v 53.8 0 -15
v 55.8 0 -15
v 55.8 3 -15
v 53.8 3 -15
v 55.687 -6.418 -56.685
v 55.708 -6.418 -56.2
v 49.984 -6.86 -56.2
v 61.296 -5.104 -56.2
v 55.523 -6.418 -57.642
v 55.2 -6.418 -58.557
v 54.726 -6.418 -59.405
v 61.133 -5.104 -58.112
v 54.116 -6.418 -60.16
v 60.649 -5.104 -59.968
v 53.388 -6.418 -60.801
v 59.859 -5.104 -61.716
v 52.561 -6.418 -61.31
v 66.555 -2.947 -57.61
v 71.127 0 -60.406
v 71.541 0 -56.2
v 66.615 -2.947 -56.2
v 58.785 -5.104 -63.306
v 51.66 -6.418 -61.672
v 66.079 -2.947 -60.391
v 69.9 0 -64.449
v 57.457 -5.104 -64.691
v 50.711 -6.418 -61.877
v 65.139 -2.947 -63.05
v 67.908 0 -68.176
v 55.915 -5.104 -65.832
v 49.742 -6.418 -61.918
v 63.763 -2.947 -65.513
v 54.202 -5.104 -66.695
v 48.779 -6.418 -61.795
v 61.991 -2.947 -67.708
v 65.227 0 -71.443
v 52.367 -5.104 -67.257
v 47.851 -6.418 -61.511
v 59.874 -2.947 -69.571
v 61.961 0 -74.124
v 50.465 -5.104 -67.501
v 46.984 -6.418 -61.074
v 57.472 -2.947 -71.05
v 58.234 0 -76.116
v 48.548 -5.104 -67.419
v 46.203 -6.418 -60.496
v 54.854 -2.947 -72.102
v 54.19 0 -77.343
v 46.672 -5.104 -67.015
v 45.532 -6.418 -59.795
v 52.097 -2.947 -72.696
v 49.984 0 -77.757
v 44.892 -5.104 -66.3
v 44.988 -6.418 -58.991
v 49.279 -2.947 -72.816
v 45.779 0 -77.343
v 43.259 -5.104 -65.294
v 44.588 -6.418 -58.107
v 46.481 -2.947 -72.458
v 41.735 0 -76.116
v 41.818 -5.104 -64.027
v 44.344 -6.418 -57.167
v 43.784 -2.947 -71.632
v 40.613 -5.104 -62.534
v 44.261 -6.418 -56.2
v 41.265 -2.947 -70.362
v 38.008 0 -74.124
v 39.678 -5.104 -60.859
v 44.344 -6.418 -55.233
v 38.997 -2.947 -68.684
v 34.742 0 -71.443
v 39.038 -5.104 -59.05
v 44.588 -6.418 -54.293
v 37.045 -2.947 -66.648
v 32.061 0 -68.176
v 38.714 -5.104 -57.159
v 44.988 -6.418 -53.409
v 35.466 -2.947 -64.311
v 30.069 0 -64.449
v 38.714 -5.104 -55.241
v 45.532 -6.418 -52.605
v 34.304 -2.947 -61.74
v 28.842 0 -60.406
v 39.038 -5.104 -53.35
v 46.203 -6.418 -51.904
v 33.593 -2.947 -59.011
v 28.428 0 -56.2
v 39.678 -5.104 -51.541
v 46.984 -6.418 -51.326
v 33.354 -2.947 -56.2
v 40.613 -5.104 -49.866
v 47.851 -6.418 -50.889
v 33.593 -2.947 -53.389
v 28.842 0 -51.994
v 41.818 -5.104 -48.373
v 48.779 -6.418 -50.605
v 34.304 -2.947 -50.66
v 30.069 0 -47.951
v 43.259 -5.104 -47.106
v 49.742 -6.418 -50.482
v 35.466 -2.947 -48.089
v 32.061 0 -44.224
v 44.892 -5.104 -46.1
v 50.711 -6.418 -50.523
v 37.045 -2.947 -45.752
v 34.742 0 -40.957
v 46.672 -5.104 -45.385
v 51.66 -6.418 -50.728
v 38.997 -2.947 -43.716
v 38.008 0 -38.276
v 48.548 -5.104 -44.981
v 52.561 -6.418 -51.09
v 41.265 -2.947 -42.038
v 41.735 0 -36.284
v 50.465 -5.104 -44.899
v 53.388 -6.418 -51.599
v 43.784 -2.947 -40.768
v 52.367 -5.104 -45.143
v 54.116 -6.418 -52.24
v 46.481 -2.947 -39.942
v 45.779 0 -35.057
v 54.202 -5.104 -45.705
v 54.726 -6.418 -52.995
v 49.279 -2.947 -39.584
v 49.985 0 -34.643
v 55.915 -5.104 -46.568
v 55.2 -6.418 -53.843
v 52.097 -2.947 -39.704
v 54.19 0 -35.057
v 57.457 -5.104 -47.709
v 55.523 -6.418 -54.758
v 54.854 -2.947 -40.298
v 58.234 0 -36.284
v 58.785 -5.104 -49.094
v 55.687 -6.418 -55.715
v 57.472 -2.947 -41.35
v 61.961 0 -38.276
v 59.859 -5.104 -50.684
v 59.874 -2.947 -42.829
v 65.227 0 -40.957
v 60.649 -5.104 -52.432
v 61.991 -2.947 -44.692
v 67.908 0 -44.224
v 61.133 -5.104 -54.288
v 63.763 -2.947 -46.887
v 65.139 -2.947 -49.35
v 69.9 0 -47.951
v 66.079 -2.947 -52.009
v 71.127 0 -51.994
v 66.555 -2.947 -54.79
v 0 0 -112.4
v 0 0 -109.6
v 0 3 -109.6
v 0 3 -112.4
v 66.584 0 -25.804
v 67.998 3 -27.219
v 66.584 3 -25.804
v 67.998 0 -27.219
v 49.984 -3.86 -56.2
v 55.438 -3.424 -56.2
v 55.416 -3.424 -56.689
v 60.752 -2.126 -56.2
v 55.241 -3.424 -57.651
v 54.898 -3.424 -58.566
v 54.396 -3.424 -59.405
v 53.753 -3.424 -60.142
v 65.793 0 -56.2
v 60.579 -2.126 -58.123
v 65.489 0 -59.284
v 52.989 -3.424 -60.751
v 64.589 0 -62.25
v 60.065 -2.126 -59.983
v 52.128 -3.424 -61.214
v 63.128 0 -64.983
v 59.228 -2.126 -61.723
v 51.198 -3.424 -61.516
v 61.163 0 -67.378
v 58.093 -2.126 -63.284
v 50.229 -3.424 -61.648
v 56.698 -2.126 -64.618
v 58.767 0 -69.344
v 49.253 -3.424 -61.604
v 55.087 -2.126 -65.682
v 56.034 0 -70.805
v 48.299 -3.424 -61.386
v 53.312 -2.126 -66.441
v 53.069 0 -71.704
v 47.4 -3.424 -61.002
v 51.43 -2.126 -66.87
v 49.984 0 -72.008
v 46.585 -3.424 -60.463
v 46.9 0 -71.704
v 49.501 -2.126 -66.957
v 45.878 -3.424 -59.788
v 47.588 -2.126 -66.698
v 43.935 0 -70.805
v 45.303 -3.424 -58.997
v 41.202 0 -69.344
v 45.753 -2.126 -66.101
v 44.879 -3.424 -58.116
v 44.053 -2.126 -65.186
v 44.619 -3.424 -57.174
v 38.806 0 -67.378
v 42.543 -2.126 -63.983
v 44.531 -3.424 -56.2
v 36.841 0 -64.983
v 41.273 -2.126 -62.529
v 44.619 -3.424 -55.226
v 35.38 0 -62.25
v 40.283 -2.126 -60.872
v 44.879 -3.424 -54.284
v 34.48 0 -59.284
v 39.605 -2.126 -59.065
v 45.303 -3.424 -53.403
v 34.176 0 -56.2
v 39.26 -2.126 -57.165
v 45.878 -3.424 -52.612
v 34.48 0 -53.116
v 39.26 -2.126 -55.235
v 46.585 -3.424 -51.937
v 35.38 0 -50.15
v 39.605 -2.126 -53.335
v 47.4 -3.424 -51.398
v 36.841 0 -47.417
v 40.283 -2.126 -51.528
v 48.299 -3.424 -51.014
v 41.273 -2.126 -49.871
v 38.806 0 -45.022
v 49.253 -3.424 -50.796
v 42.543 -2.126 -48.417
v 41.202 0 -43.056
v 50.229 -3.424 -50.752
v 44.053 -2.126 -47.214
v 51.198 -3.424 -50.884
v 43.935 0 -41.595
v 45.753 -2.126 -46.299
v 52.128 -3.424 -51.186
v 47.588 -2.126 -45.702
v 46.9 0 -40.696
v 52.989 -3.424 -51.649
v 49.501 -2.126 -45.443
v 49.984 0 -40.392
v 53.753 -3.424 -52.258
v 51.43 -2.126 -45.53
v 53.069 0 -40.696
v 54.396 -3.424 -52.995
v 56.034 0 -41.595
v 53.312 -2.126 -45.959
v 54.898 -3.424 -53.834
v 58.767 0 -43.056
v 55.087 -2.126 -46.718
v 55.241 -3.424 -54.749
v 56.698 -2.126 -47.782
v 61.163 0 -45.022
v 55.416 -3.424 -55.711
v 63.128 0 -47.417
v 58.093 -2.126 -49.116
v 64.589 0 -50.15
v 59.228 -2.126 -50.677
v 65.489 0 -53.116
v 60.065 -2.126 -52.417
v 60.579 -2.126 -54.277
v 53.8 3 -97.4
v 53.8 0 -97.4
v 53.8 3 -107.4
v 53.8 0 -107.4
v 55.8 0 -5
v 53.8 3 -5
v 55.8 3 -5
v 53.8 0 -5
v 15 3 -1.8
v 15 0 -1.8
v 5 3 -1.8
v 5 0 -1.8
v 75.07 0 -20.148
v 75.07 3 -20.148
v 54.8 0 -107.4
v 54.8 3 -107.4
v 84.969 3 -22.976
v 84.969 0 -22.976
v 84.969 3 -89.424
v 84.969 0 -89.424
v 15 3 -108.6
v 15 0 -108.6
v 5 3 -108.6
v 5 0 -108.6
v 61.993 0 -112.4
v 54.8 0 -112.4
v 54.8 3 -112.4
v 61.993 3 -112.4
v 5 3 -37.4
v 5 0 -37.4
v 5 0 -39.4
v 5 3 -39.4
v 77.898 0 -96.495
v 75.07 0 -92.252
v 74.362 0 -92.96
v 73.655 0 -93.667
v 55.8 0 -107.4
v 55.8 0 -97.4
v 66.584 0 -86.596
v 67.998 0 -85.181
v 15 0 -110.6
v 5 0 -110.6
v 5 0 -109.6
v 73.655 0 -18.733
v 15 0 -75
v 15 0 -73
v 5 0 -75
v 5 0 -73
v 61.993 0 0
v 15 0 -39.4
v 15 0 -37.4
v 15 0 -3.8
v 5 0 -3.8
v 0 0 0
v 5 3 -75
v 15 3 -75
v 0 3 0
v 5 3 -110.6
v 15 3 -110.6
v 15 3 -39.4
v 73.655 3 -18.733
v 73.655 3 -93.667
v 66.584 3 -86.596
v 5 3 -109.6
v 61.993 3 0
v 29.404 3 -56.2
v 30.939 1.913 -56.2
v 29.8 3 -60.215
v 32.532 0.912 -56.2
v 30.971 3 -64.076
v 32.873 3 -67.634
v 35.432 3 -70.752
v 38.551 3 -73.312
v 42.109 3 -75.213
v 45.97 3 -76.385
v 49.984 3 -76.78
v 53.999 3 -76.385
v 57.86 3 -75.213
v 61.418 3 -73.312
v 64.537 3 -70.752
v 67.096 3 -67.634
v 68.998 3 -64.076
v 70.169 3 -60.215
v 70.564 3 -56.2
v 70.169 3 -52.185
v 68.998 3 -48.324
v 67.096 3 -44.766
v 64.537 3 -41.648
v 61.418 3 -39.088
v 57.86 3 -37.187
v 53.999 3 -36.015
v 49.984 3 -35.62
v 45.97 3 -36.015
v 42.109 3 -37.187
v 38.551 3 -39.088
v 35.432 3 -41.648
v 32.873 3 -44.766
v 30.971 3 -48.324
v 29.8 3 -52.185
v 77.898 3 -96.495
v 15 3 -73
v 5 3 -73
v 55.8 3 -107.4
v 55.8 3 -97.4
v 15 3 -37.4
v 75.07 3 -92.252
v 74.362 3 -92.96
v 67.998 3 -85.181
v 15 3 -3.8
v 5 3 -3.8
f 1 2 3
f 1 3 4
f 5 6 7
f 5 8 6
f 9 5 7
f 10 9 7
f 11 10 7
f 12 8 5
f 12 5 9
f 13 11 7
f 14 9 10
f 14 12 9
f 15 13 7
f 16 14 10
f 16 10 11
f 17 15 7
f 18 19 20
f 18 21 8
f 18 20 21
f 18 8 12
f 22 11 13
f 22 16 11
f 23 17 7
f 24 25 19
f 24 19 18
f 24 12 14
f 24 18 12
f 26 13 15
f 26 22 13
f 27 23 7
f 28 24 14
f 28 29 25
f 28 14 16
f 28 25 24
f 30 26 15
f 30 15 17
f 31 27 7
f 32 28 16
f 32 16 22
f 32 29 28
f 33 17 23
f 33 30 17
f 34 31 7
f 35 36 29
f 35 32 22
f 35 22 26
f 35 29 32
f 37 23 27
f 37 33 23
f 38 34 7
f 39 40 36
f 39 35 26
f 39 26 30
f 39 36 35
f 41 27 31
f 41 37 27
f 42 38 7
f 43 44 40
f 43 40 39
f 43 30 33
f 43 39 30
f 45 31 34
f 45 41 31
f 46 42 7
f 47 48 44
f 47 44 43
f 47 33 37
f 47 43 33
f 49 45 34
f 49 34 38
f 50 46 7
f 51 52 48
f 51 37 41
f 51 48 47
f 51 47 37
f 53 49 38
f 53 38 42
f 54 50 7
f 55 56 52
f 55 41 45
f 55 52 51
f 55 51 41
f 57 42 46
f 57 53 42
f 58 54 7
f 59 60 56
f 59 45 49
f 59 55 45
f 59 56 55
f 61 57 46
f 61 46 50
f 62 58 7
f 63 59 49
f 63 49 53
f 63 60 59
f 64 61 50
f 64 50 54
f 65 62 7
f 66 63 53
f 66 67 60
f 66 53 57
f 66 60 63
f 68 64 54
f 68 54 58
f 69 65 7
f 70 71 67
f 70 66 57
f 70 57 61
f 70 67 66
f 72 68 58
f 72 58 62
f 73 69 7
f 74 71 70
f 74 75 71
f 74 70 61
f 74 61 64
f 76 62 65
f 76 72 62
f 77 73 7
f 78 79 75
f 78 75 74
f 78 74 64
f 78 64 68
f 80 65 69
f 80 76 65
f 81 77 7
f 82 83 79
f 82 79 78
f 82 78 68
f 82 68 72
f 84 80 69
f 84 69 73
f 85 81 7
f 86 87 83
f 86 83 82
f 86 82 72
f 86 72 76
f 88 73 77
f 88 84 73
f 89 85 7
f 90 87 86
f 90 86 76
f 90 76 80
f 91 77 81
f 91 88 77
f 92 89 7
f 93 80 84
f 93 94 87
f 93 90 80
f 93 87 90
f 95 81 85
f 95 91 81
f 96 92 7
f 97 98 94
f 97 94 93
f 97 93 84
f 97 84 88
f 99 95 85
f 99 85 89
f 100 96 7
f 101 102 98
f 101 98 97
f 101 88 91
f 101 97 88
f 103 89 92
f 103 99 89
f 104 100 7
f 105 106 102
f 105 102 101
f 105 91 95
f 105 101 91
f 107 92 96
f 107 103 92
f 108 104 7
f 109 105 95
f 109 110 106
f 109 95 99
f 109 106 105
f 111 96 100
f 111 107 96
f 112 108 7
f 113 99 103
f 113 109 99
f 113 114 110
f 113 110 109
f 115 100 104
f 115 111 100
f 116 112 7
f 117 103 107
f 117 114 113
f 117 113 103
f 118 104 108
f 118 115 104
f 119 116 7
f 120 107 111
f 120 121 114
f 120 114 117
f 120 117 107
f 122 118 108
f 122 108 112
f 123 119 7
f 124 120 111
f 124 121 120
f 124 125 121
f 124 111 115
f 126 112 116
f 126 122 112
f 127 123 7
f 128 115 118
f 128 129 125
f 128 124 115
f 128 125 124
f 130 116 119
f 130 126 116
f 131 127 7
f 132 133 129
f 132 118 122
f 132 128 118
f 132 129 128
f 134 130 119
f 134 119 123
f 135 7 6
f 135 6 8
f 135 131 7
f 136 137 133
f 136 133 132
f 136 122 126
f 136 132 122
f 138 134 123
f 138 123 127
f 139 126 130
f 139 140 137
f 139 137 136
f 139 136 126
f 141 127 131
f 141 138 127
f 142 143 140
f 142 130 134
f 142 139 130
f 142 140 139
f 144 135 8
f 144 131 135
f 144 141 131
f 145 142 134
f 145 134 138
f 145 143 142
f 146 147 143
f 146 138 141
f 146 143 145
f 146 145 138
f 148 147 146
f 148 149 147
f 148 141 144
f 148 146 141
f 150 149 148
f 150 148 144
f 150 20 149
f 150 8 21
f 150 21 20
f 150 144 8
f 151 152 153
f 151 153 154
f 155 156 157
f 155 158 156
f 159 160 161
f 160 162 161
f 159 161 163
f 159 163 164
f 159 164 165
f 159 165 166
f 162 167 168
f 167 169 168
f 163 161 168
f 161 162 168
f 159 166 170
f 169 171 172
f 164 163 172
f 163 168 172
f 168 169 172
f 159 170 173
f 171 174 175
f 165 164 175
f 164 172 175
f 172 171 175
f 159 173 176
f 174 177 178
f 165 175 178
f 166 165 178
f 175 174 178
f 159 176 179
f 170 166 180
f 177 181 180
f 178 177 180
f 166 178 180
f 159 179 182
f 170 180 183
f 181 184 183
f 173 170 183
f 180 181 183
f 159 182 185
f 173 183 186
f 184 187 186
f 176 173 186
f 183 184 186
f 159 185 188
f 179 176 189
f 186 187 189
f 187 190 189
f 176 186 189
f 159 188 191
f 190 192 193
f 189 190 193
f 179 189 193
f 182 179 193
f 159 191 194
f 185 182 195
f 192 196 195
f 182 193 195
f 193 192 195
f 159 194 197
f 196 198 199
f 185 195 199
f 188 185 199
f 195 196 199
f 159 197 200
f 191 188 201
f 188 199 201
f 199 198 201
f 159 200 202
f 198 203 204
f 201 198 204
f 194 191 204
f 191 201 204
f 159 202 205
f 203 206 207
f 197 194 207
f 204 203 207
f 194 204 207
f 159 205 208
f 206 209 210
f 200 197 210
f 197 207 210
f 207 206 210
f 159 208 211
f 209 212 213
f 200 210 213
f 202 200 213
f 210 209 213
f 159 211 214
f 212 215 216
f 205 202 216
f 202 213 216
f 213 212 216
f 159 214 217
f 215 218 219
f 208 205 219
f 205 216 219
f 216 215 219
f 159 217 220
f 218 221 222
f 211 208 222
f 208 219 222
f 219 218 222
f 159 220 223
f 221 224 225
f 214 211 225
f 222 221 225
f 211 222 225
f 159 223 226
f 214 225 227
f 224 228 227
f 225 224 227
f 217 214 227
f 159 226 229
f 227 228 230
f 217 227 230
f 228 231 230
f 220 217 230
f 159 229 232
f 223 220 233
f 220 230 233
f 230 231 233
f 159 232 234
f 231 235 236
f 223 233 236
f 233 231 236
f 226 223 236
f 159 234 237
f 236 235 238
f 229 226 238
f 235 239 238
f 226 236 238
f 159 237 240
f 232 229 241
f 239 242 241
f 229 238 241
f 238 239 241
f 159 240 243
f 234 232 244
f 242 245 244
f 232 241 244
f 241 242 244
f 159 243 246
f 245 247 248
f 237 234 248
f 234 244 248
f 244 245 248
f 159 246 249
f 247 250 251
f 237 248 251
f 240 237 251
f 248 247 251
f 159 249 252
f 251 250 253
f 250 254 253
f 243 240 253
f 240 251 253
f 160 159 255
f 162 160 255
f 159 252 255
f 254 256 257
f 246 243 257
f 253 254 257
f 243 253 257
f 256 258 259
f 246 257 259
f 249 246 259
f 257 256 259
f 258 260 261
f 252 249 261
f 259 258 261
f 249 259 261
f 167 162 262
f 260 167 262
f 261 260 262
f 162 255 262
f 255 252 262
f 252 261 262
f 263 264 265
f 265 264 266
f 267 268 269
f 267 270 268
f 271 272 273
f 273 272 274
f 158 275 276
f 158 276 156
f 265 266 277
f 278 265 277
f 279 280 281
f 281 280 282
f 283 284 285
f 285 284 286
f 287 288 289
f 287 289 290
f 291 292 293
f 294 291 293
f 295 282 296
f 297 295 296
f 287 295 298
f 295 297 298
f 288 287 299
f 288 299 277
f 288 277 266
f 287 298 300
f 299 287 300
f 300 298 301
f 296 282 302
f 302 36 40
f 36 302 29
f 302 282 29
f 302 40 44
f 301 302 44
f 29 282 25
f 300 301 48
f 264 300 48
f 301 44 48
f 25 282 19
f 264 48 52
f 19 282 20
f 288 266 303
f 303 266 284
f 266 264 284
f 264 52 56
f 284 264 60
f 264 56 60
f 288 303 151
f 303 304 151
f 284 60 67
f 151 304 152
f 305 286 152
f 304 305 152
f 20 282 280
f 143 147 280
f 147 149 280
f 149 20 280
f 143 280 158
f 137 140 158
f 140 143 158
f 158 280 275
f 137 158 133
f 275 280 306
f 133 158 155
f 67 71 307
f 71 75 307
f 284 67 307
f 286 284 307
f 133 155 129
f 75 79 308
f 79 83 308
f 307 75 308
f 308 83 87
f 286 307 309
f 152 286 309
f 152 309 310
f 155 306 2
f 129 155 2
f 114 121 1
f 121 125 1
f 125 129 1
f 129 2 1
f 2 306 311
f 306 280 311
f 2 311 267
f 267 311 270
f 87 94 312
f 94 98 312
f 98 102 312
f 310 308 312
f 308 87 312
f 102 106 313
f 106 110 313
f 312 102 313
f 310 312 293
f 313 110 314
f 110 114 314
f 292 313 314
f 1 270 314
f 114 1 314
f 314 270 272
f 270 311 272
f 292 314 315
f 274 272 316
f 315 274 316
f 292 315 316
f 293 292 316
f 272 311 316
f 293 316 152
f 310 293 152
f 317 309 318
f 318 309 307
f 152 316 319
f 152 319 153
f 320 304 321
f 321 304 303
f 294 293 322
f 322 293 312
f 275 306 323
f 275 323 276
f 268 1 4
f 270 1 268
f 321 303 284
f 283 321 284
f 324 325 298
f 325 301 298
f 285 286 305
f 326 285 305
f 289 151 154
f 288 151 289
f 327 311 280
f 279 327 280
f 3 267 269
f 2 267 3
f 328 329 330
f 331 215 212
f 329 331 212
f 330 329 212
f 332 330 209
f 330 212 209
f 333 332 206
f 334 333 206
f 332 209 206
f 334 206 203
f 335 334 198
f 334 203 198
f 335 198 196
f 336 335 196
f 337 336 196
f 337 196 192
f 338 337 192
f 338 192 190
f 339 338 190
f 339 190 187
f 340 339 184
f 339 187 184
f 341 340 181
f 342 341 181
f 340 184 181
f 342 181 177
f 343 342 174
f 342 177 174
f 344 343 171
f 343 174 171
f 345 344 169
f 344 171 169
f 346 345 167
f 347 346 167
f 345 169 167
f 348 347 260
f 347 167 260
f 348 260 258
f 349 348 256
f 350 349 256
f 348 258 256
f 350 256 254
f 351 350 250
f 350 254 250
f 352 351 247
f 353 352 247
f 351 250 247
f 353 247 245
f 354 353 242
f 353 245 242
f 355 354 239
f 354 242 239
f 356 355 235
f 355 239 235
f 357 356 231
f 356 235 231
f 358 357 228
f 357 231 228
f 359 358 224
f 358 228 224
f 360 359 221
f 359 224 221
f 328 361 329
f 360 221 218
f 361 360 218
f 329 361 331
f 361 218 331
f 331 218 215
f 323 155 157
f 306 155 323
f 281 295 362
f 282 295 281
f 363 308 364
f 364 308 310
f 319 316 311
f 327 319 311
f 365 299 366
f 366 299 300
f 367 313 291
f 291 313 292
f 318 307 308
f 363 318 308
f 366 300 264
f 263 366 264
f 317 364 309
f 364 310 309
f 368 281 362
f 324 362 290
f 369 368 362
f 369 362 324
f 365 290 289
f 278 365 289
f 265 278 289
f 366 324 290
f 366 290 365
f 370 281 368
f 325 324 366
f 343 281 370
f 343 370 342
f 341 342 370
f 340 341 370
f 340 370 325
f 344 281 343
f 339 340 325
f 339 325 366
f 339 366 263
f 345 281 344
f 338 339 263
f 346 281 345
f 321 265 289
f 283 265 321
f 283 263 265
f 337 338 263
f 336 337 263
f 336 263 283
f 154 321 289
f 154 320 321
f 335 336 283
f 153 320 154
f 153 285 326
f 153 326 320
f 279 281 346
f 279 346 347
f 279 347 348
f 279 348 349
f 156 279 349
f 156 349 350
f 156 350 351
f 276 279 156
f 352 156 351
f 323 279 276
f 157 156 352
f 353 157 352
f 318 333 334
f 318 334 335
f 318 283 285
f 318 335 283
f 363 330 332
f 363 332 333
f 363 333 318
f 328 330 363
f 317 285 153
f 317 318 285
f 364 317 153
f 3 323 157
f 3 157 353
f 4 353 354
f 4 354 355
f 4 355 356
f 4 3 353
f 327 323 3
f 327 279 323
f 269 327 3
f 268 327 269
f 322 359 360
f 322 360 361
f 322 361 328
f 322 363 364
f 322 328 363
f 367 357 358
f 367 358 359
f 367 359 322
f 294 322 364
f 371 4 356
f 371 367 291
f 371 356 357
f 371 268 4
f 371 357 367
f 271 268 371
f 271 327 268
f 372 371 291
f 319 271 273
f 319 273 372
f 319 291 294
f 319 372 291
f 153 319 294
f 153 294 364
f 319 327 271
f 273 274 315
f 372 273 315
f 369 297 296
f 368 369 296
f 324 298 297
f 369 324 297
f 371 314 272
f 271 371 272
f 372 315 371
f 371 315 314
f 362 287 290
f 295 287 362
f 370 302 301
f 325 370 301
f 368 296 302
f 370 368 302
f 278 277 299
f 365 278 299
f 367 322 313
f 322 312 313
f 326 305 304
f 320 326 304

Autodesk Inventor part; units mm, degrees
ref_plane "YZ Plane" through (0, 0, 0) normal (1, 0, 0) x (0, 1, 0)
ref_plane "XZ Plane" through (0, 0, 0) normal (0, 1, 0) x (-1, 0, 0)
sketch "Sketch1" plane through (0, 0, 0) normal (0, 1, 0) x (-1, 0, 0)
  line L0 (0, 0) -> (0, -112.4)
  line L1 (0, 0) -> (112.4, 0) construction
  line L2 (0, -112.4) -> (-61.993, -112.4)
  line L3 (0, -112.4) -> (61.993, -112.4) construction
  line L4 (0, 0) -> (-61.993, 0)
  line L5 (0, 0) -> (61.993, 0) construction
  line L6 (-61.993, -112.4) -> (-84.969, -89.424)
  line L7 (-61.993, -112.4) -> (-29.5, -112.4) construction
  line L8 (-61.993, 0) -> (-84.969, -22.976)
  line L9 (-61.993, 0) -> (-29.5, 0) construction
  line L10 (-84.969, -22.976) -> (-84.969, -89.424)
  line L11 (-84.969, -56.2) -> (-89.969, -56.2)
  line L12 (-84.969, -89.424) -> (-89.969, -56.2)
  line L13 (-84.969, -22.976) -> (-89.969, -56.2)
  line L14 (0, -112.4) -> (0, -109.6)
  line L15 (0, -109.6) -> (-5, -109.6)
  line L16 (-5, -109.6) -> (-5, -110.6)
  line L17 (-5, -110.6) -> (-15, -110.6)
  line L18 (-15, -110.6) -> (-15, -108.6)
  line L19 (-15, -108.6) -> (-5, -108.6)
  line L20 (-5, -108.6) -> (-5, -109.6)
  line L21 (-15, -75) -> (-15, -73)
  line L22 (-15, -73) -> (-5, -73)
  line L23 (-5, -75) -> (-15, -75)
  line L24 (-5, -74) -> (-5, -75)
  line L25 (-5, -73) -> (-5, -74)
  line L26 (-15, -39.4) -> (-15, -37.4)
  line L27 (-15, -37.4) -> (-5, -37.4)
  line L28 (-5, -39.4) -> (-15, -39.4)
  line L29 (-5, -38.4) -> (-5, -39.4)
  line L30 (-5, -37.4) -> (-5, -38.4)
  line L31 (-15, -3.8) -> (-15, -1.8)
  line L32 (-15, -1.8) -> (-5, -1.8)
  line L33 (-5, -3.8) -> (-15, -3.8)
  line L34 (-5, -2.8) -> (-5, -3.8)
  line L35 (-5, -1.8) -> (-5, -2.8)
  line L36 (-84.969, -89.424) -> (-77.898, -96.495)
  line L37 (-77.898, -96.495) -> (-74.3624, -92.9595)
  line L38 (-74.3624, -92.9595) -> (-75.0695, -92.2524)
  line L39 (-75.0695, -92.2524) -> (-67.9985, -85.1813)
  line L40 (-67.9985, -85.1813) -> (-66.5842, -86.5956)
  line L41 (-66.5842, -86.5956) -> (-73.6553, -93.6666)
  line L42 (-73.6553, -93.6666) -> (-74.3624, -92.9595)
  line L43 (-74.3624, -19.4405) -> (-75.0695, -20.1476)
  line L44 (-75.0695, -20.1476) -> (-67.9985, -27.2187)
  line L45 (-67.9985, -27.2187) -> (-66.5842, -25.8044)
  line L46 (-66.5842, -25.8044) -> (-73.6553, -18.7334)
  line L47 (-73.6553, -18.7334) -> (-74.3624, -19.4405)
  line L48 (-61.993, -112.4) -> (-54.8, -112.4)
  line L49 (-54.8, -112.4) -> (-54.8, -107.4)
  line L50 (-54.8, -107.4) -> (-55.8, -107.4)
  line L51 (-55.8, -107.4) -> (-55.8, -97.4)
  line L52 (-55.8, -97.4) -> (-53.8, -97.4)
  line L53 (-53.8, -97.4) -> (-53.8, -107.4)
  line L54 (-53.8, -107.4) -> (-54.8, -107.4)
  line L55 (-54.8, -5) -> (-55.8, -5)
  line L56 (-55.8, -5) -> (-55.8, -15)
  line L57 (-55.8, -15) -> (-53.8, -15)
  line L58 (-53.8, -15) -> (-53.8, -5)
  line L59 (-53.8, -5) -> (-54.8, -5)
  dimension "d0" = 112.4
  dimension "d1" = 90
  dimension "d2" = 61.993
  dimension "d3" = 180
  dimension "d4" = 61.993
  dimension "d5" = 180
  dimension "d24" = 32.493
  dimension "d25" = 225
  dimension "d26" = 32.493
  dimension "d27" = 225
  dimension "d28" = 5
  dimension "d29" = 2.8
  dimension "d30" = 5
  dimension "d31" = 1
  dimension "d32" = 10
  dimension "d33" = 2
  dimension "d34" = 10
  dimension "d35" = 90
  dimension "d38" = 35.6
  dimension "d43" = 10
  dimension "d44" = 5
  dimension "d45" = 1
  dimension "d46" = 10
  dimension "d47" = 2
  dimension "d57" = 7.193
  dimension "d58" = 5
  dimension "d59" = 90
  dimension "d60" = 1
  dimension "d61" = 10
  dimension "d62" = 2
  dimension "d63" = 10
  dimension "d64" = 90
extrude "Extrusion1" add sketch "Sketch1" along normal blind 3 contours L0 L2 L6 L10 L8 L4
ref_plane "Work Plane1" through (0, 3, -56.2) normal (0, 0, 1) x (1, 0, 0)
sketch "Sketch4" plane through (0, 3, -56.2) normal (0, 0, 1) x (1, 0, 0)
  line L0 (15, 0) -> (84.969, 0)
  line L1 (84.969, 0) -> (61.993, 0) projected
  line L2 (84.969, 0) -> (49.9845, 0)
  line L3 (61.993, 0) -> (0, 0) projected
  line L4 (49.9845, 0) -> (49.9845, 27.44)
  circle A0 centre (49.9845, 27.44) radius 34.3
  line L5 (49.9845, -6.86) -> (49.9845, 61.74)
  point P0 (0, -3)
  dimension "d53" = 34.9845
  dimension "d54" = 27.44
  dimension "d55" = 68.6
revolve "Revolution2" cut sketch "Sketch4" angle 360 about axis through (49.9845, 3, -56.2) along (0, 1, 0) picked at (38.3687, -1.2506) picked at (43.1245, 9.1467) contours L5 A0 L0 | L0 A0 L5 L4
sketch "Sketch6" plane through (0, 3, -56.2) normal (0, 0, 1) x (1, 0, 0)
  line L0 (15, 0) -> (84.969, 0)
  line L1 (84.969, 0) -> (61.993, 0)
  line L2 (84.969, 0) -> (49.9845, 0)
  line L3 (61.993, 0) -> (0, 0)
  line L4 (49.9845, 0) -> (49.9845, 27.44)
  circle A0 centre (49.9845, 27.44) radius 34.3
  line L5 (49.9845, -6.86) -> (49.9845, 61.74)
  circle A1 centre (49.9845, 27.44) radius 37.3
  line L6 (49.9845, -9.86) -> (49.9845, -3)
  line L7 (84.969, -3) -> (61.993, -3) projected
  line L8 (71.5413, -3) -> (28.4277, -3)
  point P0 (0, -3)
  point P1 (0, -3)
  point P2 (65.7926, -3)
  dimension "d70" = 34.9845
  dimension "d71" = 27.44
  dimension "d72" = 68.6
  dimension "d73" = 3
revolve "Revolution4" add sketch "Sketch6" angle 360 about axis through (49.9845, -3.86, -56.2) along (0, 1, 0) contours A0 L7 A1 L6
properties part number "PalmInsert"
